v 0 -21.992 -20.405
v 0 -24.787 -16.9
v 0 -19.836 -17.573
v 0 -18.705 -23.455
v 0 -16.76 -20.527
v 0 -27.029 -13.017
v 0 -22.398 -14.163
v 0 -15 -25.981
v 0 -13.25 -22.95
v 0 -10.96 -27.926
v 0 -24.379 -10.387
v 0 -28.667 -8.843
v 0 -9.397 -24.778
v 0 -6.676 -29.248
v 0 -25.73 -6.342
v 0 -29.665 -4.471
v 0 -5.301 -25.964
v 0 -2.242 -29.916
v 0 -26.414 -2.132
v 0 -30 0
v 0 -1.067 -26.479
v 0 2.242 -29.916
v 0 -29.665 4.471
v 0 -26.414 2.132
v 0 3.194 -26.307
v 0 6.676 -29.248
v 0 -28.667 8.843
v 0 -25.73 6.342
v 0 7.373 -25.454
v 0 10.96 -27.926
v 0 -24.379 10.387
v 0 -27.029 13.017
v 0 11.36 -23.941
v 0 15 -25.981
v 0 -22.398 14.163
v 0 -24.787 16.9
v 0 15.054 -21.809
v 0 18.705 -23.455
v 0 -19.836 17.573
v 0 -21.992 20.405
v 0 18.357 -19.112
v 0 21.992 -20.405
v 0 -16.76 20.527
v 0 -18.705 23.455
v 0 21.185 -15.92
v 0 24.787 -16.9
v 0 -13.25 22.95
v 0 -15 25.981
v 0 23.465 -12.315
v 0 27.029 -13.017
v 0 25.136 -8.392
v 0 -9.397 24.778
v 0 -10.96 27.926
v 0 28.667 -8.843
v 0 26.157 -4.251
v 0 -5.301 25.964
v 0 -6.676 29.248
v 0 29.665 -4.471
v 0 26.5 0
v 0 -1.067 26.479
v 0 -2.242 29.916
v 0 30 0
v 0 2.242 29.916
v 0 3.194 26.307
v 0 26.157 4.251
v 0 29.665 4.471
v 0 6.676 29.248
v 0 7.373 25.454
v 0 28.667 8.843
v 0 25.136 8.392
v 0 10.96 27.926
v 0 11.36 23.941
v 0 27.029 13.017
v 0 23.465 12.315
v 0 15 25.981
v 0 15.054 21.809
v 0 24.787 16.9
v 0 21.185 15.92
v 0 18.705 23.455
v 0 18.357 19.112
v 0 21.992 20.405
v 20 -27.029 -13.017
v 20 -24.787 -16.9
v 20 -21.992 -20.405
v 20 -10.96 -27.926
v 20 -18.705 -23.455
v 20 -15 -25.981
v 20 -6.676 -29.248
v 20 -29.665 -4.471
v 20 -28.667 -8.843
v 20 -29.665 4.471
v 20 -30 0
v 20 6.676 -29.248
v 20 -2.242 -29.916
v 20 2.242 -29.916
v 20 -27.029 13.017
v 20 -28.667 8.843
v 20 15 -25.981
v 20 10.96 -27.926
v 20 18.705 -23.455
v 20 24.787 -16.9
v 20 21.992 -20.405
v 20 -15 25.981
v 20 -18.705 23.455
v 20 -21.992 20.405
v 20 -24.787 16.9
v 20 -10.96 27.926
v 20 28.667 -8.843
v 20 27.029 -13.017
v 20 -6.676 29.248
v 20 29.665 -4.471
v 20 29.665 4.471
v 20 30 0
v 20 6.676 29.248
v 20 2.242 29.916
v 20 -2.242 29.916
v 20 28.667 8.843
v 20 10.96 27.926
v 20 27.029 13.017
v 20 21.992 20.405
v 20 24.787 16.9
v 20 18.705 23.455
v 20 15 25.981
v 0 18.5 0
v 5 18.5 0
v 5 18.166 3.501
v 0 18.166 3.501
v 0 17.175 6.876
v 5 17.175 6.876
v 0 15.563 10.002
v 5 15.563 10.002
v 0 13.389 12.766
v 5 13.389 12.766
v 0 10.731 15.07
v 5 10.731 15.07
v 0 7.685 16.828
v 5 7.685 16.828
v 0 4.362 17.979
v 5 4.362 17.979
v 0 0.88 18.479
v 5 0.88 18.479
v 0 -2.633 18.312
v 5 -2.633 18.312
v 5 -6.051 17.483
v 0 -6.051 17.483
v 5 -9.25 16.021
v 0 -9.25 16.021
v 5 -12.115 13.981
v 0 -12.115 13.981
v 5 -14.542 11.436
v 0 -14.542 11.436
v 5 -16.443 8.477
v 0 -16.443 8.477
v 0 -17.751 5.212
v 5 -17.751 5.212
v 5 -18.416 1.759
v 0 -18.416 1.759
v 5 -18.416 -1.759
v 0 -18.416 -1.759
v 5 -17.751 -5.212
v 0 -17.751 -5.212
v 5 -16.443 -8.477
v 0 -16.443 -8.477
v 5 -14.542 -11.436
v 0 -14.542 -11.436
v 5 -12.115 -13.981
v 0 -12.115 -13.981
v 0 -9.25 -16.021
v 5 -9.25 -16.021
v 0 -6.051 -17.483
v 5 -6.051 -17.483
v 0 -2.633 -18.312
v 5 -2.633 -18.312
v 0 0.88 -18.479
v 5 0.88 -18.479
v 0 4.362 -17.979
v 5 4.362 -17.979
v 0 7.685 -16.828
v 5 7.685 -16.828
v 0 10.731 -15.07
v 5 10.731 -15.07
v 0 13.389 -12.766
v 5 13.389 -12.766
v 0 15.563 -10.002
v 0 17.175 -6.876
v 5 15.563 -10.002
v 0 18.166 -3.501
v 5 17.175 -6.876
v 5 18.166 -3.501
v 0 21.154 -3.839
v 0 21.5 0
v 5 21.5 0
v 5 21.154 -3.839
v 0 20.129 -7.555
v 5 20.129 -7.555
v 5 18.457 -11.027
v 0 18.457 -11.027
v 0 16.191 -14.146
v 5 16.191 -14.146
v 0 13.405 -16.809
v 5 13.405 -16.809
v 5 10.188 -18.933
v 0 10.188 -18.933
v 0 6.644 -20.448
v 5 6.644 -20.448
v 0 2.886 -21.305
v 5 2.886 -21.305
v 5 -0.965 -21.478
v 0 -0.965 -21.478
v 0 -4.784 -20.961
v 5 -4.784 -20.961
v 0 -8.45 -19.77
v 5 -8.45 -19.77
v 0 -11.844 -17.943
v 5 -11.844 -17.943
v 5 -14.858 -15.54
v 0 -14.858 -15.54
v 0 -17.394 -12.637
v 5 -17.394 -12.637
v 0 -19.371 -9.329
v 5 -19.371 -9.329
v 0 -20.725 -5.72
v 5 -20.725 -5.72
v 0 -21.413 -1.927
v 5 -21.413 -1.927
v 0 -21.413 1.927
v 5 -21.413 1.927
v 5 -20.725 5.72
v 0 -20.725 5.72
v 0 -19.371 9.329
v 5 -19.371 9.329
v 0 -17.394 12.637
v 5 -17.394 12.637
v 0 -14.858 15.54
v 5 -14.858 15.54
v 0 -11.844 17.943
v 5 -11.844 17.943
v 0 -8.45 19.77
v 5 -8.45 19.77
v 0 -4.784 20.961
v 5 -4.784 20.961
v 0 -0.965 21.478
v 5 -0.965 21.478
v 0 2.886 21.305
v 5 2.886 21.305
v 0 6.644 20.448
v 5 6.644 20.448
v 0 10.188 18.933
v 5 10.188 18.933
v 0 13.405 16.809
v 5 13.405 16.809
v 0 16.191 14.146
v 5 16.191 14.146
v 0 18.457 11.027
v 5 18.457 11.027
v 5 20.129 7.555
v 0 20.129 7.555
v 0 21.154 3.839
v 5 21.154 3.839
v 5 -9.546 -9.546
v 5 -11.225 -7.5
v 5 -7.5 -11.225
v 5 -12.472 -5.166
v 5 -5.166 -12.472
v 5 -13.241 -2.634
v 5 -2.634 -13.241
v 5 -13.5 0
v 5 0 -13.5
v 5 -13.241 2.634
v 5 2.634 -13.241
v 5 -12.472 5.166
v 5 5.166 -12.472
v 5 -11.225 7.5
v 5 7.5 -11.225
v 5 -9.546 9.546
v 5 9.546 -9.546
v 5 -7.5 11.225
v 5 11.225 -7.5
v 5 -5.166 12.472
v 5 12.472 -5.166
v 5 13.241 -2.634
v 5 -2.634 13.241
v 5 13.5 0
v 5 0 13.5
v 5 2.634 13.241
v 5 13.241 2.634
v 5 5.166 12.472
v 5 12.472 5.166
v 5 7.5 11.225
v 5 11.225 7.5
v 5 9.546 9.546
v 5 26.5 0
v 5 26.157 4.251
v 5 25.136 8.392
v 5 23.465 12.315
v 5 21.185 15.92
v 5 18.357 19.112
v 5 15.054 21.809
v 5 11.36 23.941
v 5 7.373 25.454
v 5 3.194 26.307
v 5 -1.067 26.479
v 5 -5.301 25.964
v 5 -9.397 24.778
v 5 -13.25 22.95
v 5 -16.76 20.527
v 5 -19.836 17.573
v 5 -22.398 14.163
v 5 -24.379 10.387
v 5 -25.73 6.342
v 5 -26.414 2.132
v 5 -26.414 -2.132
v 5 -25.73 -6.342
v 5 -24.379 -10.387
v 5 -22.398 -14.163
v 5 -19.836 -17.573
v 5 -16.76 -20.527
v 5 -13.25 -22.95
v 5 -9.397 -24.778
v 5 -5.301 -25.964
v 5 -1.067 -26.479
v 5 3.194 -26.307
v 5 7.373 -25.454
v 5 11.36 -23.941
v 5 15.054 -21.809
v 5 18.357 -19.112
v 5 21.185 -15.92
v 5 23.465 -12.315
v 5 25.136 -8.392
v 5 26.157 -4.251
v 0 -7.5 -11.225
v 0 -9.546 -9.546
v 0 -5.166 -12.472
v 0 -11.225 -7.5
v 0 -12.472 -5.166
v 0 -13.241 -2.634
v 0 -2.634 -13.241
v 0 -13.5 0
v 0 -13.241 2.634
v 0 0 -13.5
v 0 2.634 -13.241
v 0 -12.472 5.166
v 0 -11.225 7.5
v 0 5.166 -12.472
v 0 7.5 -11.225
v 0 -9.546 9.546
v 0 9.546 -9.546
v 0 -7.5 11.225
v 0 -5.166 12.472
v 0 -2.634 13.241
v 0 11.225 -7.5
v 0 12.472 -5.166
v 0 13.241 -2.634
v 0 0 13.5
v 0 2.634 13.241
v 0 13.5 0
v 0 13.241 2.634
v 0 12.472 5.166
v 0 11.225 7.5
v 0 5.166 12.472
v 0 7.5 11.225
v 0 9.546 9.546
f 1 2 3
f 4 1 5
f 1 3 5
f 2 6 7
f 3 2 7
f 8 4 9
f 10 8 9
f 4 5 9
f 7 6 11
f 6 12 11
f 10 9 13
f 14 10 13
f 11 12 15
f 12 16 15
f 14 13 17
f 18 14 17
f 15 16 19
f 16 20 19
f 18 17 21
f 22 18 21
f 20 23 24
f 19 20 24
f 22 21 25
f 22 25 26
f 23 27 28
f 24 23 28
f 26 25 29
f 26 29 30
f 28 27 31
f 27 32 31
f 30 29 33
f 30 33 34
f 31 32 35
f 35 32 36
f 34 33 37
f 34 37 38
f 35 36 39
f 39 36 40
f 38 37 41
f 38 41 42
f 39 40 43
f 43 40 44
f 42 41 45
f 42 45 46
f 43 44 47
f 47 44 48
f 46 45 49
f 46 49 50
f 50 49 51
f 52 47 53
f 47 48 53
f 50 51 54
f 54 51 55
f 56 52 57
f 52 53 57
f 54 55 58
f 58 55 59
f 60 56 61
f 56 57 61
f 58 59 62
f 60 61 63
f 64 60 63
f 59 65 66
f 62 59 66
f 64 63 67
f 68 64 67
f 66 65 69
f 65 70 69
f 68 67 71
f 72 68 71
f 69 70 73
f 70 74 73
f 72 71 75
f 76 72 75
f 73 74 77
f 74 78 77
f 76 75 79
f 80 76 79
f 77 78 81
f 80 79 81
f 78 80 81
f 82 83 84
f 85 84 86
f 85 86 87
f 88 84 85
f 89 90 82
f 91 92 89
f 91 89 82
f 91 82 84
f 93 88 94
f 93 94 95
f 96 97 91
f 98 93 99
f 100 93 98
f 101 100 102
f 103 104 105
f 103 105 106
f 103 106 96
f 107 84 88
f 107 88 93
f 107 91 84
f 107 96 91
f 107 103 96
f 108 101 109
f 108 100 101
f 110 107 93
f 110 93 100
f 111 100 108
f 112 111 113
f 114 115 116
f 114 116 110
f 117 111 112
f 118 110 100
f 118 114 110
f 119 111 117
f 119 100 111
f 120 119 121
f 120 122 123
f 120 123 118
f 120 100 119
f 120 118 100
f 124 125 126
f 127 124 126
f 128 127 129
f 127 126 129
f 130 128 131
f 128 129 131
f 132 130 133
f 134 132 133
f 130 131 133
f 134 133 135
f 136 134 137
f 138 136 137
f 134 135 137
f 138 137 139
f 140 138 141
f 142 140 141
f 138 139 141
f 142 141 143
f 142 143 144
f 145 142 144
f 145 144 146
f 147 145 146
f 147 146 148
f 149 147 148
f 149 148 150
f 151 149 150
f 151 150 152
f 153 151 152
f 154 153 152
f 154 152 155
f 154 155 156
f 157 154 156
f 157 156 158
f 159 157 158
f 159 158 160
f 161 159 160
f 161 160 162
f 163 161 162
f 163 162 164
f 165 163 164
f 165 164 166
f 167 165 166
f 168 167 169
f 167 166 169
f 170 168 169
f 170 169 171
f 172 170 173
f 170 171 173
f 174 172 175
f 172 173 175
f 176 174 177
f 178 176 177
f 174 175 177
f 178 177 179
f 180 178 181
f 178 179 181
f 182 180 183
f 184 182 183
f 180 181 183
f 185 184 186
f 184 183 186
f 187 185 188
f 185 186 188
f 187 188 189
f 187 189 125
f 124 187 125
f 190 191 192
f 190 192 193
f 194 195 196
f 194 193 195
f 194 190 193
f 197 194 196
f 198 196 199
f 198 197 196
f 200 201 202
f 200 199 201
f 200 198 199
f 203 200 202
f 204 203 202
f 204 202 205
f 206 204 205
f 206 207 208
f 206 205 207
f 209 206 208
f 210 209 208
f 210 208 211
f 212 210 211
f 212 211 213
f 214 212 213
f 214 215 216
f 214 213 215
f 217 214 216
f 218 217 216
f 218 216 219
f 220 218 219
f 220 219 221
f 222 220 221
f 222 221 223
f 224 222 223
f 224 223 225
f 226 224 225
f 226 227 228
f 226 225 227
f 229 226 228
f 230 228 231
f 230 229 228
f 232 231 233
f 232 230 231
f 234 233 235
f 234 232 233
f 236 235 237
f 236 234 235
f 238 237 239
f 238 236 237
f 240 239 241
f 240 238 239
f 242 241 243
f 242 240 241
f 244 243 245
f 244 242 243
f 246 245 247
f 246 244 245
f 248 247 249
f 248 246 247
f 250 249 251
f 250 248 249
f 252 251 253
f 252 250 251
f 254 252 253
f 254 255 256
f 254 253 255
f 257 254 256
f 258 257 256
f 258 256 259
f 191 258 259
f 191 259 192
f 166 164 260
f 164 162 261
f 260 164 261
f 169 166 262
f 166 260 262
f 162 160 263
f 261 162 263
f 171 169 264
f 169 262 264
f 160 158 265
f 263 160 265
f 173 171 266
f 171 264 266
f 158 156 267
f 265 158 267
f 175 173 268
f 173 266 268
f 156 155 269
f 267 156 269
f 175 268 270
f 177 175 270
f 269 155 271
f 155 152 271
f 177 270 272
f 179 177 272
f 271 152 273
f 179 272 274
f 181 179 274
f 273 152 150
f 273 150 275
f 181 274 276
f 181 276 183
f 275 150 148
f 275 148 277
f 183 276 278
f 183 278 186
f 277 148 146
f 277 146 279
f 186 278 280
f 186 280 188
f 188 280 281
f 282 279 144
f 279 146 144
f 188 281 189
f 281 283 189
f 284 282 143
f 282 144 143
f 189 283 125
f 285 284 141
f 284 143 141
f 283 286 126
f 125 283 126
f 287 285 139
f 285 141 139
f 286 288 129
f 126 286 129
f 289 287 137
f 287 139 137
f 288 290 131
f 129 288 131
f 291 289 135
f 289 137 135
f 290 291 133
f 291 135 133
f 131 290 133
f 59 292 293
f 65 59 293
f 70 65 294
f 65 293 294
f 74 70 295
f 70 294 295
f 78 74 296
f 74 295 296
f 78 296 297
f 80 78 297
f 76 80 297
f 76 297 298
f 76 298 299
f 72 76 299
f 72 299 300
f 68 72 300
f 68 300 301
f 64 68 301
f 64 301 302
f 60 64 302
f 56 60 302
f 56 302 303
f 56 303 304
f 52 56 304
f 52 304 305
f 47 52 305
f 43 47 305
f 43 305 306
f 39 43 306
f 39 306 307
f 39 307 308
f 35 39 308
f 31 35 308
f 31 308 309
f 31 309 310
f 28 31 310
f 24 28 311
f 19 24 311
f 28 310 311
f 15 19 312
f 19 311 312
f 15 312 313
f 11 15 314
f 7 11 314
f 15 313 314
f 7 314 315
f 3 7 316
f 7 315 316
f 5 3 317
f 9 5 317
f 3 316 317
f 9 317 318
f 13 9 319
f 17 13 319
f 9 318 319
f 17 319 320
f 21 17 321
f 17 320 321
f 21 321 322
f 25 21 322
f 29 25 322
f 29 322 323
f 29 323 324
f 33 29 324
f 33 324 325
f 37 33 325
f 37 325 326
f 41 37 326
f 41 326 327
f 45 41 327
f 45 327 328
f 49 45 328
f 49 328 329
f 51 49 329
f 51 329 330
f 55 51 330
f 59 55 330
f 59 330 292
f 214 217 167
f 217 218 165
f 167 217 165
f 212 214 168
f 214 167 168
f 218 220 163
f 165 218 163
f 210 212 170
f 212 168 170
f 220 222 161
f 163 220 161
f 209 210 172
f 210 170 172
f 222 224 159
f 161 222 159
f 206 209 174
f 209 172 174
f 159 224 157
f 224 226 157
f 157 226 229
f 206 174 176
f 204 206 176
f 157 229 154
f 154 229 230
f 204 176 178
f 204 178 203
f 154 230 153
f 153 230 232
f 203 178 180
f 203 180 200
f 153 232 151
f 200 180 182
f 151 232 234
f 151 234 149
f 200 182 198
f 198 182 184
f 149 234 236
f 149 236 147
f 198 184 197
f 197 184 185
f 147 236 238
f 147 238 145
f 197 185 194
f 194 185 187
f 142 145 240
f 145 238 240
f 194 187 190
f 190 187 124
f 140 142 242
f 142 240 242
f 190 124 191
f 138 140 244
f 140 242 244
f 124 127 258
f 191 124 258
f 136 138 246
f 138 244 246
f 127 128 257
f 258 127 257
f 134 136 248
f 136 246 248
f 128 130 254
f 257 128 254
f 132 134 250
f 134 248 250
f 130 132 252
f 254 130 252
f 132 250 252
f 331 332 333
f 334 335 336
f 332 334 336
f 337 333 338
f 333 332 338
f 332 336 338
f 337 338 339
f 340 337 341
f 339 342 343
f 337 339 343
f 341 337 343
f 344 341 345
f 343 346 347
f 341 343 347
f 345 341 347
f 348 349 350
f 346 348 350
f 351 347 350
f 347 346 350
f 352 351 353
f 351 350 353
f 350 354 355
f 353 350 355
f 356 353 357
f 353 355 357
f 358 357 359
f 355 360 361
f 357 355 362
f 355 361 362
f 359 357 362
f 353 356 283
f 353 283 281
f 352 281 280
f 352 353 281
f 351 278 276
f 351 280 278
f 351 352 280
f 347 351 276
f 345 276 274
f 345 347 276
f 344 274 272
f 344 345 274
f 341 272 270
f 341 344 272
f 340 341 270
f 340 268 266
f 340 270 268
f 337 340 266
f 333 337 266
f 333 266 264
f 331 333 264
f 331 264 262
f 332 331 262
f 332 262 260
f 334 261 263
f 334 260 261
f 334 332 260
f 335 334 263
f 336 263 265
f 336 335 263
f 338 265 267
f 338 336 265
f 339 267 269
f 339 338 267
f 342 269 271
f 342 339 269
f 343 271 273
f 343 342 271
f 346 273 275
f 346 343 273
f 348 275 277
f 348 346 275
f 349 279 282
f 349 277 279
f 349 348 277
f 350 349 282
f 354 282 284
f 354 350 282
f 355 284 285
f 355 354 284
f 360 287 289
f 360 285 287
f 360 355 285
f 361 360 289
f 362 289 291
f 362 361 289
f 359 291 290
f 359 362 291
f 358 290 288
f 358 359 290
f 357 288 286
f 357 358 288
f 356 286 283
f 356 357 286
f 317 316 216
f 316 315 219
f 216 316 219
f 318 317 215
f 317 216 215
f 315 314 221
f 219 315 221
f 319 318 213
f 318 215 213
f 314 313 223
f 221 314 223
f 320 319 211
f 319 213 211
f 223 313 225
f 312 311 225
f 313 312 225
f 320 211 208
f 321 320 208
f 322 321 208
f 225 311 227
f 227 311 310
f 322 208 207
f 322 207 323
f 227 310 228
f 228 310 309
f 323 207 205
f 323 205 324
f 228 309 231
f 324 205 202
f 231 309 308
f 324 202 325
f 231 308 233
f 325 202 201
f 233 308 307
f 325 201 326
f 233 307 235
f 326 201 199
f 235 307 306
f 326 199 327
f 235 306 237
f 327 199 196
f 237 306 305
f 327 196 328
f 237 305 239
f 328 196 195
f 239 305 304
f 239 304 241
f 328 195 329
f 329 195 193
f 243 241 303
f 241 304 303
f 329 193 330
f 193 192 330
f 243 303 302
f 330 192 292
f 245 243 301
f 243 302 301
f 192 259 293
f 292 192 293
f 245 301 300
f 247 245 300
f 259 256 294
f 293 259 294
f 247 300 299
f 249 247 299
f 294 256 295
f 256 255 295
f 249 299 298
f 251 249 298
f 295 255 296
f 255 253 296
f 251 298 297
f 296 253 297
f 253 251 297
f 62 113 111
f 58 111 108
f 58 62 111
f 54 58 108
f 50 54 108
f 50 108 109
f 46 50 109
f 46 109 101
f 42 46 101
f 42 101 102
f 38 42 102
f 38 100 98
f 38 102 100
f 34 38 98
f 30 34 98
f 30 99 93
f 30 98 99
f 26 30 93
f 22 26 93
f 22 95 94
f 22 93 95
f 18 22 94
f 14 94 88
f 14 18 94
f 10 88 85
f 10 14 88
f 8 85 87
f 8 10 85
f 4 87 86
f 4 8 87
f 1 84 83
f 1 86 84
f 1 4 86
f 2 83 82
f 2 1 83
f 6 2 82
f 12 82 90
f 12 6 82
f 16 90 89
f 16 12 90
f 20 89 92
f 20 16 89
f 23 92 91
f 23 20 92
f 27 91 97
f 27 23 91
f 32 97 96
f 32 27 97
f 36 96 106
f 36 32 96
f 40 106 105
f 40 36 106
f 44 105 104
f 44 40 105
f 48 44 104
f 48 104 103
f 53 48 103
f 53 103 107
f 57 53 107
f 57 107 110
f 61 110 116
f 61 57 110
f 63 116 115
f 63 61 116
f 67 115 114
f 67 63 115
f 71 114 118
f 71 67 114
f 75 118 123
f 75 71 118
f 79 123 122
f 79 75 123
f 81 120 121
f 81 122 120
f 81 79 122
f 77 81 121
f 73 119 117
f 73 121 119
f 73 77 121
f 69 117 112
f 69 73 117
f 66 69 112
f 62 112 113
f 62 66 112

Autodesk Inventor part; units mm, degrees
ref_plane "YZ Plane" through (0, 0, 0) normal (1, 0, 0) x (0, 1, 0)
ref_plane "XZ Plane" through (0, 0, 0) normal (0, 1, 0) x (-1, 0, 0)
ref_plane "XY Plane" through (0, 0, 0) normal (0, 0, 1) x (1, 0, 0)
sketch "Эскиз1" plane through (0, 0, 0) normal (0, 0, 1) x (1, 0, 0)
  line L0 (0, 0) -> (20, 0)
  line L1 (20, 0) -> (20, 30)
  line L2 (20, 30) -> (0, 30)
  line L3 (0, 30) -> (0, 0)
  dimension "d0" = 20
  dimension "d1" = 30
revolve "Вращение1" add sketch "Эскиз1" angle 360 about axis through (0, 0, 0) along (1, 0, 0)
sketch "Эскиз3" plane through (0, 0, 0) normal (0, 0, 1) x (1, 0, 0)
  line L0 (0, -30) -> (0, 30) construction
  line L1 (0, 26.5) -> (5, 26.5)
  line L2 (5, 26.5) -> (5, 21.5)
  line L3 (5, 21.5) -> (0, 21.5)
  line L4 (0, 21.5) -> (0, 26.5)
  line L5 (0, 18.5) -> (5, 18.5)
  line L6 (5, 18.5) -> (5, 13.5)
  line L7 (5, 13.5) -> (0, 13.5)
  line L8 (0, 13.5) -> (0, 18.5)
  line L9 (0, 0) -> (20, 0)
  line L10 (20, -30) -> (20, 30) projected
  dimension "d9" = 5
  dimension "d10" = 5
  dimension "d11" = 3
  dimension "d12" = 13.5
revolve "Вращение2" cut sketch "Эскиз3" angle 360 about axis through (0, 0, 0) along (1, 0, 0)
properties part number "711115"
